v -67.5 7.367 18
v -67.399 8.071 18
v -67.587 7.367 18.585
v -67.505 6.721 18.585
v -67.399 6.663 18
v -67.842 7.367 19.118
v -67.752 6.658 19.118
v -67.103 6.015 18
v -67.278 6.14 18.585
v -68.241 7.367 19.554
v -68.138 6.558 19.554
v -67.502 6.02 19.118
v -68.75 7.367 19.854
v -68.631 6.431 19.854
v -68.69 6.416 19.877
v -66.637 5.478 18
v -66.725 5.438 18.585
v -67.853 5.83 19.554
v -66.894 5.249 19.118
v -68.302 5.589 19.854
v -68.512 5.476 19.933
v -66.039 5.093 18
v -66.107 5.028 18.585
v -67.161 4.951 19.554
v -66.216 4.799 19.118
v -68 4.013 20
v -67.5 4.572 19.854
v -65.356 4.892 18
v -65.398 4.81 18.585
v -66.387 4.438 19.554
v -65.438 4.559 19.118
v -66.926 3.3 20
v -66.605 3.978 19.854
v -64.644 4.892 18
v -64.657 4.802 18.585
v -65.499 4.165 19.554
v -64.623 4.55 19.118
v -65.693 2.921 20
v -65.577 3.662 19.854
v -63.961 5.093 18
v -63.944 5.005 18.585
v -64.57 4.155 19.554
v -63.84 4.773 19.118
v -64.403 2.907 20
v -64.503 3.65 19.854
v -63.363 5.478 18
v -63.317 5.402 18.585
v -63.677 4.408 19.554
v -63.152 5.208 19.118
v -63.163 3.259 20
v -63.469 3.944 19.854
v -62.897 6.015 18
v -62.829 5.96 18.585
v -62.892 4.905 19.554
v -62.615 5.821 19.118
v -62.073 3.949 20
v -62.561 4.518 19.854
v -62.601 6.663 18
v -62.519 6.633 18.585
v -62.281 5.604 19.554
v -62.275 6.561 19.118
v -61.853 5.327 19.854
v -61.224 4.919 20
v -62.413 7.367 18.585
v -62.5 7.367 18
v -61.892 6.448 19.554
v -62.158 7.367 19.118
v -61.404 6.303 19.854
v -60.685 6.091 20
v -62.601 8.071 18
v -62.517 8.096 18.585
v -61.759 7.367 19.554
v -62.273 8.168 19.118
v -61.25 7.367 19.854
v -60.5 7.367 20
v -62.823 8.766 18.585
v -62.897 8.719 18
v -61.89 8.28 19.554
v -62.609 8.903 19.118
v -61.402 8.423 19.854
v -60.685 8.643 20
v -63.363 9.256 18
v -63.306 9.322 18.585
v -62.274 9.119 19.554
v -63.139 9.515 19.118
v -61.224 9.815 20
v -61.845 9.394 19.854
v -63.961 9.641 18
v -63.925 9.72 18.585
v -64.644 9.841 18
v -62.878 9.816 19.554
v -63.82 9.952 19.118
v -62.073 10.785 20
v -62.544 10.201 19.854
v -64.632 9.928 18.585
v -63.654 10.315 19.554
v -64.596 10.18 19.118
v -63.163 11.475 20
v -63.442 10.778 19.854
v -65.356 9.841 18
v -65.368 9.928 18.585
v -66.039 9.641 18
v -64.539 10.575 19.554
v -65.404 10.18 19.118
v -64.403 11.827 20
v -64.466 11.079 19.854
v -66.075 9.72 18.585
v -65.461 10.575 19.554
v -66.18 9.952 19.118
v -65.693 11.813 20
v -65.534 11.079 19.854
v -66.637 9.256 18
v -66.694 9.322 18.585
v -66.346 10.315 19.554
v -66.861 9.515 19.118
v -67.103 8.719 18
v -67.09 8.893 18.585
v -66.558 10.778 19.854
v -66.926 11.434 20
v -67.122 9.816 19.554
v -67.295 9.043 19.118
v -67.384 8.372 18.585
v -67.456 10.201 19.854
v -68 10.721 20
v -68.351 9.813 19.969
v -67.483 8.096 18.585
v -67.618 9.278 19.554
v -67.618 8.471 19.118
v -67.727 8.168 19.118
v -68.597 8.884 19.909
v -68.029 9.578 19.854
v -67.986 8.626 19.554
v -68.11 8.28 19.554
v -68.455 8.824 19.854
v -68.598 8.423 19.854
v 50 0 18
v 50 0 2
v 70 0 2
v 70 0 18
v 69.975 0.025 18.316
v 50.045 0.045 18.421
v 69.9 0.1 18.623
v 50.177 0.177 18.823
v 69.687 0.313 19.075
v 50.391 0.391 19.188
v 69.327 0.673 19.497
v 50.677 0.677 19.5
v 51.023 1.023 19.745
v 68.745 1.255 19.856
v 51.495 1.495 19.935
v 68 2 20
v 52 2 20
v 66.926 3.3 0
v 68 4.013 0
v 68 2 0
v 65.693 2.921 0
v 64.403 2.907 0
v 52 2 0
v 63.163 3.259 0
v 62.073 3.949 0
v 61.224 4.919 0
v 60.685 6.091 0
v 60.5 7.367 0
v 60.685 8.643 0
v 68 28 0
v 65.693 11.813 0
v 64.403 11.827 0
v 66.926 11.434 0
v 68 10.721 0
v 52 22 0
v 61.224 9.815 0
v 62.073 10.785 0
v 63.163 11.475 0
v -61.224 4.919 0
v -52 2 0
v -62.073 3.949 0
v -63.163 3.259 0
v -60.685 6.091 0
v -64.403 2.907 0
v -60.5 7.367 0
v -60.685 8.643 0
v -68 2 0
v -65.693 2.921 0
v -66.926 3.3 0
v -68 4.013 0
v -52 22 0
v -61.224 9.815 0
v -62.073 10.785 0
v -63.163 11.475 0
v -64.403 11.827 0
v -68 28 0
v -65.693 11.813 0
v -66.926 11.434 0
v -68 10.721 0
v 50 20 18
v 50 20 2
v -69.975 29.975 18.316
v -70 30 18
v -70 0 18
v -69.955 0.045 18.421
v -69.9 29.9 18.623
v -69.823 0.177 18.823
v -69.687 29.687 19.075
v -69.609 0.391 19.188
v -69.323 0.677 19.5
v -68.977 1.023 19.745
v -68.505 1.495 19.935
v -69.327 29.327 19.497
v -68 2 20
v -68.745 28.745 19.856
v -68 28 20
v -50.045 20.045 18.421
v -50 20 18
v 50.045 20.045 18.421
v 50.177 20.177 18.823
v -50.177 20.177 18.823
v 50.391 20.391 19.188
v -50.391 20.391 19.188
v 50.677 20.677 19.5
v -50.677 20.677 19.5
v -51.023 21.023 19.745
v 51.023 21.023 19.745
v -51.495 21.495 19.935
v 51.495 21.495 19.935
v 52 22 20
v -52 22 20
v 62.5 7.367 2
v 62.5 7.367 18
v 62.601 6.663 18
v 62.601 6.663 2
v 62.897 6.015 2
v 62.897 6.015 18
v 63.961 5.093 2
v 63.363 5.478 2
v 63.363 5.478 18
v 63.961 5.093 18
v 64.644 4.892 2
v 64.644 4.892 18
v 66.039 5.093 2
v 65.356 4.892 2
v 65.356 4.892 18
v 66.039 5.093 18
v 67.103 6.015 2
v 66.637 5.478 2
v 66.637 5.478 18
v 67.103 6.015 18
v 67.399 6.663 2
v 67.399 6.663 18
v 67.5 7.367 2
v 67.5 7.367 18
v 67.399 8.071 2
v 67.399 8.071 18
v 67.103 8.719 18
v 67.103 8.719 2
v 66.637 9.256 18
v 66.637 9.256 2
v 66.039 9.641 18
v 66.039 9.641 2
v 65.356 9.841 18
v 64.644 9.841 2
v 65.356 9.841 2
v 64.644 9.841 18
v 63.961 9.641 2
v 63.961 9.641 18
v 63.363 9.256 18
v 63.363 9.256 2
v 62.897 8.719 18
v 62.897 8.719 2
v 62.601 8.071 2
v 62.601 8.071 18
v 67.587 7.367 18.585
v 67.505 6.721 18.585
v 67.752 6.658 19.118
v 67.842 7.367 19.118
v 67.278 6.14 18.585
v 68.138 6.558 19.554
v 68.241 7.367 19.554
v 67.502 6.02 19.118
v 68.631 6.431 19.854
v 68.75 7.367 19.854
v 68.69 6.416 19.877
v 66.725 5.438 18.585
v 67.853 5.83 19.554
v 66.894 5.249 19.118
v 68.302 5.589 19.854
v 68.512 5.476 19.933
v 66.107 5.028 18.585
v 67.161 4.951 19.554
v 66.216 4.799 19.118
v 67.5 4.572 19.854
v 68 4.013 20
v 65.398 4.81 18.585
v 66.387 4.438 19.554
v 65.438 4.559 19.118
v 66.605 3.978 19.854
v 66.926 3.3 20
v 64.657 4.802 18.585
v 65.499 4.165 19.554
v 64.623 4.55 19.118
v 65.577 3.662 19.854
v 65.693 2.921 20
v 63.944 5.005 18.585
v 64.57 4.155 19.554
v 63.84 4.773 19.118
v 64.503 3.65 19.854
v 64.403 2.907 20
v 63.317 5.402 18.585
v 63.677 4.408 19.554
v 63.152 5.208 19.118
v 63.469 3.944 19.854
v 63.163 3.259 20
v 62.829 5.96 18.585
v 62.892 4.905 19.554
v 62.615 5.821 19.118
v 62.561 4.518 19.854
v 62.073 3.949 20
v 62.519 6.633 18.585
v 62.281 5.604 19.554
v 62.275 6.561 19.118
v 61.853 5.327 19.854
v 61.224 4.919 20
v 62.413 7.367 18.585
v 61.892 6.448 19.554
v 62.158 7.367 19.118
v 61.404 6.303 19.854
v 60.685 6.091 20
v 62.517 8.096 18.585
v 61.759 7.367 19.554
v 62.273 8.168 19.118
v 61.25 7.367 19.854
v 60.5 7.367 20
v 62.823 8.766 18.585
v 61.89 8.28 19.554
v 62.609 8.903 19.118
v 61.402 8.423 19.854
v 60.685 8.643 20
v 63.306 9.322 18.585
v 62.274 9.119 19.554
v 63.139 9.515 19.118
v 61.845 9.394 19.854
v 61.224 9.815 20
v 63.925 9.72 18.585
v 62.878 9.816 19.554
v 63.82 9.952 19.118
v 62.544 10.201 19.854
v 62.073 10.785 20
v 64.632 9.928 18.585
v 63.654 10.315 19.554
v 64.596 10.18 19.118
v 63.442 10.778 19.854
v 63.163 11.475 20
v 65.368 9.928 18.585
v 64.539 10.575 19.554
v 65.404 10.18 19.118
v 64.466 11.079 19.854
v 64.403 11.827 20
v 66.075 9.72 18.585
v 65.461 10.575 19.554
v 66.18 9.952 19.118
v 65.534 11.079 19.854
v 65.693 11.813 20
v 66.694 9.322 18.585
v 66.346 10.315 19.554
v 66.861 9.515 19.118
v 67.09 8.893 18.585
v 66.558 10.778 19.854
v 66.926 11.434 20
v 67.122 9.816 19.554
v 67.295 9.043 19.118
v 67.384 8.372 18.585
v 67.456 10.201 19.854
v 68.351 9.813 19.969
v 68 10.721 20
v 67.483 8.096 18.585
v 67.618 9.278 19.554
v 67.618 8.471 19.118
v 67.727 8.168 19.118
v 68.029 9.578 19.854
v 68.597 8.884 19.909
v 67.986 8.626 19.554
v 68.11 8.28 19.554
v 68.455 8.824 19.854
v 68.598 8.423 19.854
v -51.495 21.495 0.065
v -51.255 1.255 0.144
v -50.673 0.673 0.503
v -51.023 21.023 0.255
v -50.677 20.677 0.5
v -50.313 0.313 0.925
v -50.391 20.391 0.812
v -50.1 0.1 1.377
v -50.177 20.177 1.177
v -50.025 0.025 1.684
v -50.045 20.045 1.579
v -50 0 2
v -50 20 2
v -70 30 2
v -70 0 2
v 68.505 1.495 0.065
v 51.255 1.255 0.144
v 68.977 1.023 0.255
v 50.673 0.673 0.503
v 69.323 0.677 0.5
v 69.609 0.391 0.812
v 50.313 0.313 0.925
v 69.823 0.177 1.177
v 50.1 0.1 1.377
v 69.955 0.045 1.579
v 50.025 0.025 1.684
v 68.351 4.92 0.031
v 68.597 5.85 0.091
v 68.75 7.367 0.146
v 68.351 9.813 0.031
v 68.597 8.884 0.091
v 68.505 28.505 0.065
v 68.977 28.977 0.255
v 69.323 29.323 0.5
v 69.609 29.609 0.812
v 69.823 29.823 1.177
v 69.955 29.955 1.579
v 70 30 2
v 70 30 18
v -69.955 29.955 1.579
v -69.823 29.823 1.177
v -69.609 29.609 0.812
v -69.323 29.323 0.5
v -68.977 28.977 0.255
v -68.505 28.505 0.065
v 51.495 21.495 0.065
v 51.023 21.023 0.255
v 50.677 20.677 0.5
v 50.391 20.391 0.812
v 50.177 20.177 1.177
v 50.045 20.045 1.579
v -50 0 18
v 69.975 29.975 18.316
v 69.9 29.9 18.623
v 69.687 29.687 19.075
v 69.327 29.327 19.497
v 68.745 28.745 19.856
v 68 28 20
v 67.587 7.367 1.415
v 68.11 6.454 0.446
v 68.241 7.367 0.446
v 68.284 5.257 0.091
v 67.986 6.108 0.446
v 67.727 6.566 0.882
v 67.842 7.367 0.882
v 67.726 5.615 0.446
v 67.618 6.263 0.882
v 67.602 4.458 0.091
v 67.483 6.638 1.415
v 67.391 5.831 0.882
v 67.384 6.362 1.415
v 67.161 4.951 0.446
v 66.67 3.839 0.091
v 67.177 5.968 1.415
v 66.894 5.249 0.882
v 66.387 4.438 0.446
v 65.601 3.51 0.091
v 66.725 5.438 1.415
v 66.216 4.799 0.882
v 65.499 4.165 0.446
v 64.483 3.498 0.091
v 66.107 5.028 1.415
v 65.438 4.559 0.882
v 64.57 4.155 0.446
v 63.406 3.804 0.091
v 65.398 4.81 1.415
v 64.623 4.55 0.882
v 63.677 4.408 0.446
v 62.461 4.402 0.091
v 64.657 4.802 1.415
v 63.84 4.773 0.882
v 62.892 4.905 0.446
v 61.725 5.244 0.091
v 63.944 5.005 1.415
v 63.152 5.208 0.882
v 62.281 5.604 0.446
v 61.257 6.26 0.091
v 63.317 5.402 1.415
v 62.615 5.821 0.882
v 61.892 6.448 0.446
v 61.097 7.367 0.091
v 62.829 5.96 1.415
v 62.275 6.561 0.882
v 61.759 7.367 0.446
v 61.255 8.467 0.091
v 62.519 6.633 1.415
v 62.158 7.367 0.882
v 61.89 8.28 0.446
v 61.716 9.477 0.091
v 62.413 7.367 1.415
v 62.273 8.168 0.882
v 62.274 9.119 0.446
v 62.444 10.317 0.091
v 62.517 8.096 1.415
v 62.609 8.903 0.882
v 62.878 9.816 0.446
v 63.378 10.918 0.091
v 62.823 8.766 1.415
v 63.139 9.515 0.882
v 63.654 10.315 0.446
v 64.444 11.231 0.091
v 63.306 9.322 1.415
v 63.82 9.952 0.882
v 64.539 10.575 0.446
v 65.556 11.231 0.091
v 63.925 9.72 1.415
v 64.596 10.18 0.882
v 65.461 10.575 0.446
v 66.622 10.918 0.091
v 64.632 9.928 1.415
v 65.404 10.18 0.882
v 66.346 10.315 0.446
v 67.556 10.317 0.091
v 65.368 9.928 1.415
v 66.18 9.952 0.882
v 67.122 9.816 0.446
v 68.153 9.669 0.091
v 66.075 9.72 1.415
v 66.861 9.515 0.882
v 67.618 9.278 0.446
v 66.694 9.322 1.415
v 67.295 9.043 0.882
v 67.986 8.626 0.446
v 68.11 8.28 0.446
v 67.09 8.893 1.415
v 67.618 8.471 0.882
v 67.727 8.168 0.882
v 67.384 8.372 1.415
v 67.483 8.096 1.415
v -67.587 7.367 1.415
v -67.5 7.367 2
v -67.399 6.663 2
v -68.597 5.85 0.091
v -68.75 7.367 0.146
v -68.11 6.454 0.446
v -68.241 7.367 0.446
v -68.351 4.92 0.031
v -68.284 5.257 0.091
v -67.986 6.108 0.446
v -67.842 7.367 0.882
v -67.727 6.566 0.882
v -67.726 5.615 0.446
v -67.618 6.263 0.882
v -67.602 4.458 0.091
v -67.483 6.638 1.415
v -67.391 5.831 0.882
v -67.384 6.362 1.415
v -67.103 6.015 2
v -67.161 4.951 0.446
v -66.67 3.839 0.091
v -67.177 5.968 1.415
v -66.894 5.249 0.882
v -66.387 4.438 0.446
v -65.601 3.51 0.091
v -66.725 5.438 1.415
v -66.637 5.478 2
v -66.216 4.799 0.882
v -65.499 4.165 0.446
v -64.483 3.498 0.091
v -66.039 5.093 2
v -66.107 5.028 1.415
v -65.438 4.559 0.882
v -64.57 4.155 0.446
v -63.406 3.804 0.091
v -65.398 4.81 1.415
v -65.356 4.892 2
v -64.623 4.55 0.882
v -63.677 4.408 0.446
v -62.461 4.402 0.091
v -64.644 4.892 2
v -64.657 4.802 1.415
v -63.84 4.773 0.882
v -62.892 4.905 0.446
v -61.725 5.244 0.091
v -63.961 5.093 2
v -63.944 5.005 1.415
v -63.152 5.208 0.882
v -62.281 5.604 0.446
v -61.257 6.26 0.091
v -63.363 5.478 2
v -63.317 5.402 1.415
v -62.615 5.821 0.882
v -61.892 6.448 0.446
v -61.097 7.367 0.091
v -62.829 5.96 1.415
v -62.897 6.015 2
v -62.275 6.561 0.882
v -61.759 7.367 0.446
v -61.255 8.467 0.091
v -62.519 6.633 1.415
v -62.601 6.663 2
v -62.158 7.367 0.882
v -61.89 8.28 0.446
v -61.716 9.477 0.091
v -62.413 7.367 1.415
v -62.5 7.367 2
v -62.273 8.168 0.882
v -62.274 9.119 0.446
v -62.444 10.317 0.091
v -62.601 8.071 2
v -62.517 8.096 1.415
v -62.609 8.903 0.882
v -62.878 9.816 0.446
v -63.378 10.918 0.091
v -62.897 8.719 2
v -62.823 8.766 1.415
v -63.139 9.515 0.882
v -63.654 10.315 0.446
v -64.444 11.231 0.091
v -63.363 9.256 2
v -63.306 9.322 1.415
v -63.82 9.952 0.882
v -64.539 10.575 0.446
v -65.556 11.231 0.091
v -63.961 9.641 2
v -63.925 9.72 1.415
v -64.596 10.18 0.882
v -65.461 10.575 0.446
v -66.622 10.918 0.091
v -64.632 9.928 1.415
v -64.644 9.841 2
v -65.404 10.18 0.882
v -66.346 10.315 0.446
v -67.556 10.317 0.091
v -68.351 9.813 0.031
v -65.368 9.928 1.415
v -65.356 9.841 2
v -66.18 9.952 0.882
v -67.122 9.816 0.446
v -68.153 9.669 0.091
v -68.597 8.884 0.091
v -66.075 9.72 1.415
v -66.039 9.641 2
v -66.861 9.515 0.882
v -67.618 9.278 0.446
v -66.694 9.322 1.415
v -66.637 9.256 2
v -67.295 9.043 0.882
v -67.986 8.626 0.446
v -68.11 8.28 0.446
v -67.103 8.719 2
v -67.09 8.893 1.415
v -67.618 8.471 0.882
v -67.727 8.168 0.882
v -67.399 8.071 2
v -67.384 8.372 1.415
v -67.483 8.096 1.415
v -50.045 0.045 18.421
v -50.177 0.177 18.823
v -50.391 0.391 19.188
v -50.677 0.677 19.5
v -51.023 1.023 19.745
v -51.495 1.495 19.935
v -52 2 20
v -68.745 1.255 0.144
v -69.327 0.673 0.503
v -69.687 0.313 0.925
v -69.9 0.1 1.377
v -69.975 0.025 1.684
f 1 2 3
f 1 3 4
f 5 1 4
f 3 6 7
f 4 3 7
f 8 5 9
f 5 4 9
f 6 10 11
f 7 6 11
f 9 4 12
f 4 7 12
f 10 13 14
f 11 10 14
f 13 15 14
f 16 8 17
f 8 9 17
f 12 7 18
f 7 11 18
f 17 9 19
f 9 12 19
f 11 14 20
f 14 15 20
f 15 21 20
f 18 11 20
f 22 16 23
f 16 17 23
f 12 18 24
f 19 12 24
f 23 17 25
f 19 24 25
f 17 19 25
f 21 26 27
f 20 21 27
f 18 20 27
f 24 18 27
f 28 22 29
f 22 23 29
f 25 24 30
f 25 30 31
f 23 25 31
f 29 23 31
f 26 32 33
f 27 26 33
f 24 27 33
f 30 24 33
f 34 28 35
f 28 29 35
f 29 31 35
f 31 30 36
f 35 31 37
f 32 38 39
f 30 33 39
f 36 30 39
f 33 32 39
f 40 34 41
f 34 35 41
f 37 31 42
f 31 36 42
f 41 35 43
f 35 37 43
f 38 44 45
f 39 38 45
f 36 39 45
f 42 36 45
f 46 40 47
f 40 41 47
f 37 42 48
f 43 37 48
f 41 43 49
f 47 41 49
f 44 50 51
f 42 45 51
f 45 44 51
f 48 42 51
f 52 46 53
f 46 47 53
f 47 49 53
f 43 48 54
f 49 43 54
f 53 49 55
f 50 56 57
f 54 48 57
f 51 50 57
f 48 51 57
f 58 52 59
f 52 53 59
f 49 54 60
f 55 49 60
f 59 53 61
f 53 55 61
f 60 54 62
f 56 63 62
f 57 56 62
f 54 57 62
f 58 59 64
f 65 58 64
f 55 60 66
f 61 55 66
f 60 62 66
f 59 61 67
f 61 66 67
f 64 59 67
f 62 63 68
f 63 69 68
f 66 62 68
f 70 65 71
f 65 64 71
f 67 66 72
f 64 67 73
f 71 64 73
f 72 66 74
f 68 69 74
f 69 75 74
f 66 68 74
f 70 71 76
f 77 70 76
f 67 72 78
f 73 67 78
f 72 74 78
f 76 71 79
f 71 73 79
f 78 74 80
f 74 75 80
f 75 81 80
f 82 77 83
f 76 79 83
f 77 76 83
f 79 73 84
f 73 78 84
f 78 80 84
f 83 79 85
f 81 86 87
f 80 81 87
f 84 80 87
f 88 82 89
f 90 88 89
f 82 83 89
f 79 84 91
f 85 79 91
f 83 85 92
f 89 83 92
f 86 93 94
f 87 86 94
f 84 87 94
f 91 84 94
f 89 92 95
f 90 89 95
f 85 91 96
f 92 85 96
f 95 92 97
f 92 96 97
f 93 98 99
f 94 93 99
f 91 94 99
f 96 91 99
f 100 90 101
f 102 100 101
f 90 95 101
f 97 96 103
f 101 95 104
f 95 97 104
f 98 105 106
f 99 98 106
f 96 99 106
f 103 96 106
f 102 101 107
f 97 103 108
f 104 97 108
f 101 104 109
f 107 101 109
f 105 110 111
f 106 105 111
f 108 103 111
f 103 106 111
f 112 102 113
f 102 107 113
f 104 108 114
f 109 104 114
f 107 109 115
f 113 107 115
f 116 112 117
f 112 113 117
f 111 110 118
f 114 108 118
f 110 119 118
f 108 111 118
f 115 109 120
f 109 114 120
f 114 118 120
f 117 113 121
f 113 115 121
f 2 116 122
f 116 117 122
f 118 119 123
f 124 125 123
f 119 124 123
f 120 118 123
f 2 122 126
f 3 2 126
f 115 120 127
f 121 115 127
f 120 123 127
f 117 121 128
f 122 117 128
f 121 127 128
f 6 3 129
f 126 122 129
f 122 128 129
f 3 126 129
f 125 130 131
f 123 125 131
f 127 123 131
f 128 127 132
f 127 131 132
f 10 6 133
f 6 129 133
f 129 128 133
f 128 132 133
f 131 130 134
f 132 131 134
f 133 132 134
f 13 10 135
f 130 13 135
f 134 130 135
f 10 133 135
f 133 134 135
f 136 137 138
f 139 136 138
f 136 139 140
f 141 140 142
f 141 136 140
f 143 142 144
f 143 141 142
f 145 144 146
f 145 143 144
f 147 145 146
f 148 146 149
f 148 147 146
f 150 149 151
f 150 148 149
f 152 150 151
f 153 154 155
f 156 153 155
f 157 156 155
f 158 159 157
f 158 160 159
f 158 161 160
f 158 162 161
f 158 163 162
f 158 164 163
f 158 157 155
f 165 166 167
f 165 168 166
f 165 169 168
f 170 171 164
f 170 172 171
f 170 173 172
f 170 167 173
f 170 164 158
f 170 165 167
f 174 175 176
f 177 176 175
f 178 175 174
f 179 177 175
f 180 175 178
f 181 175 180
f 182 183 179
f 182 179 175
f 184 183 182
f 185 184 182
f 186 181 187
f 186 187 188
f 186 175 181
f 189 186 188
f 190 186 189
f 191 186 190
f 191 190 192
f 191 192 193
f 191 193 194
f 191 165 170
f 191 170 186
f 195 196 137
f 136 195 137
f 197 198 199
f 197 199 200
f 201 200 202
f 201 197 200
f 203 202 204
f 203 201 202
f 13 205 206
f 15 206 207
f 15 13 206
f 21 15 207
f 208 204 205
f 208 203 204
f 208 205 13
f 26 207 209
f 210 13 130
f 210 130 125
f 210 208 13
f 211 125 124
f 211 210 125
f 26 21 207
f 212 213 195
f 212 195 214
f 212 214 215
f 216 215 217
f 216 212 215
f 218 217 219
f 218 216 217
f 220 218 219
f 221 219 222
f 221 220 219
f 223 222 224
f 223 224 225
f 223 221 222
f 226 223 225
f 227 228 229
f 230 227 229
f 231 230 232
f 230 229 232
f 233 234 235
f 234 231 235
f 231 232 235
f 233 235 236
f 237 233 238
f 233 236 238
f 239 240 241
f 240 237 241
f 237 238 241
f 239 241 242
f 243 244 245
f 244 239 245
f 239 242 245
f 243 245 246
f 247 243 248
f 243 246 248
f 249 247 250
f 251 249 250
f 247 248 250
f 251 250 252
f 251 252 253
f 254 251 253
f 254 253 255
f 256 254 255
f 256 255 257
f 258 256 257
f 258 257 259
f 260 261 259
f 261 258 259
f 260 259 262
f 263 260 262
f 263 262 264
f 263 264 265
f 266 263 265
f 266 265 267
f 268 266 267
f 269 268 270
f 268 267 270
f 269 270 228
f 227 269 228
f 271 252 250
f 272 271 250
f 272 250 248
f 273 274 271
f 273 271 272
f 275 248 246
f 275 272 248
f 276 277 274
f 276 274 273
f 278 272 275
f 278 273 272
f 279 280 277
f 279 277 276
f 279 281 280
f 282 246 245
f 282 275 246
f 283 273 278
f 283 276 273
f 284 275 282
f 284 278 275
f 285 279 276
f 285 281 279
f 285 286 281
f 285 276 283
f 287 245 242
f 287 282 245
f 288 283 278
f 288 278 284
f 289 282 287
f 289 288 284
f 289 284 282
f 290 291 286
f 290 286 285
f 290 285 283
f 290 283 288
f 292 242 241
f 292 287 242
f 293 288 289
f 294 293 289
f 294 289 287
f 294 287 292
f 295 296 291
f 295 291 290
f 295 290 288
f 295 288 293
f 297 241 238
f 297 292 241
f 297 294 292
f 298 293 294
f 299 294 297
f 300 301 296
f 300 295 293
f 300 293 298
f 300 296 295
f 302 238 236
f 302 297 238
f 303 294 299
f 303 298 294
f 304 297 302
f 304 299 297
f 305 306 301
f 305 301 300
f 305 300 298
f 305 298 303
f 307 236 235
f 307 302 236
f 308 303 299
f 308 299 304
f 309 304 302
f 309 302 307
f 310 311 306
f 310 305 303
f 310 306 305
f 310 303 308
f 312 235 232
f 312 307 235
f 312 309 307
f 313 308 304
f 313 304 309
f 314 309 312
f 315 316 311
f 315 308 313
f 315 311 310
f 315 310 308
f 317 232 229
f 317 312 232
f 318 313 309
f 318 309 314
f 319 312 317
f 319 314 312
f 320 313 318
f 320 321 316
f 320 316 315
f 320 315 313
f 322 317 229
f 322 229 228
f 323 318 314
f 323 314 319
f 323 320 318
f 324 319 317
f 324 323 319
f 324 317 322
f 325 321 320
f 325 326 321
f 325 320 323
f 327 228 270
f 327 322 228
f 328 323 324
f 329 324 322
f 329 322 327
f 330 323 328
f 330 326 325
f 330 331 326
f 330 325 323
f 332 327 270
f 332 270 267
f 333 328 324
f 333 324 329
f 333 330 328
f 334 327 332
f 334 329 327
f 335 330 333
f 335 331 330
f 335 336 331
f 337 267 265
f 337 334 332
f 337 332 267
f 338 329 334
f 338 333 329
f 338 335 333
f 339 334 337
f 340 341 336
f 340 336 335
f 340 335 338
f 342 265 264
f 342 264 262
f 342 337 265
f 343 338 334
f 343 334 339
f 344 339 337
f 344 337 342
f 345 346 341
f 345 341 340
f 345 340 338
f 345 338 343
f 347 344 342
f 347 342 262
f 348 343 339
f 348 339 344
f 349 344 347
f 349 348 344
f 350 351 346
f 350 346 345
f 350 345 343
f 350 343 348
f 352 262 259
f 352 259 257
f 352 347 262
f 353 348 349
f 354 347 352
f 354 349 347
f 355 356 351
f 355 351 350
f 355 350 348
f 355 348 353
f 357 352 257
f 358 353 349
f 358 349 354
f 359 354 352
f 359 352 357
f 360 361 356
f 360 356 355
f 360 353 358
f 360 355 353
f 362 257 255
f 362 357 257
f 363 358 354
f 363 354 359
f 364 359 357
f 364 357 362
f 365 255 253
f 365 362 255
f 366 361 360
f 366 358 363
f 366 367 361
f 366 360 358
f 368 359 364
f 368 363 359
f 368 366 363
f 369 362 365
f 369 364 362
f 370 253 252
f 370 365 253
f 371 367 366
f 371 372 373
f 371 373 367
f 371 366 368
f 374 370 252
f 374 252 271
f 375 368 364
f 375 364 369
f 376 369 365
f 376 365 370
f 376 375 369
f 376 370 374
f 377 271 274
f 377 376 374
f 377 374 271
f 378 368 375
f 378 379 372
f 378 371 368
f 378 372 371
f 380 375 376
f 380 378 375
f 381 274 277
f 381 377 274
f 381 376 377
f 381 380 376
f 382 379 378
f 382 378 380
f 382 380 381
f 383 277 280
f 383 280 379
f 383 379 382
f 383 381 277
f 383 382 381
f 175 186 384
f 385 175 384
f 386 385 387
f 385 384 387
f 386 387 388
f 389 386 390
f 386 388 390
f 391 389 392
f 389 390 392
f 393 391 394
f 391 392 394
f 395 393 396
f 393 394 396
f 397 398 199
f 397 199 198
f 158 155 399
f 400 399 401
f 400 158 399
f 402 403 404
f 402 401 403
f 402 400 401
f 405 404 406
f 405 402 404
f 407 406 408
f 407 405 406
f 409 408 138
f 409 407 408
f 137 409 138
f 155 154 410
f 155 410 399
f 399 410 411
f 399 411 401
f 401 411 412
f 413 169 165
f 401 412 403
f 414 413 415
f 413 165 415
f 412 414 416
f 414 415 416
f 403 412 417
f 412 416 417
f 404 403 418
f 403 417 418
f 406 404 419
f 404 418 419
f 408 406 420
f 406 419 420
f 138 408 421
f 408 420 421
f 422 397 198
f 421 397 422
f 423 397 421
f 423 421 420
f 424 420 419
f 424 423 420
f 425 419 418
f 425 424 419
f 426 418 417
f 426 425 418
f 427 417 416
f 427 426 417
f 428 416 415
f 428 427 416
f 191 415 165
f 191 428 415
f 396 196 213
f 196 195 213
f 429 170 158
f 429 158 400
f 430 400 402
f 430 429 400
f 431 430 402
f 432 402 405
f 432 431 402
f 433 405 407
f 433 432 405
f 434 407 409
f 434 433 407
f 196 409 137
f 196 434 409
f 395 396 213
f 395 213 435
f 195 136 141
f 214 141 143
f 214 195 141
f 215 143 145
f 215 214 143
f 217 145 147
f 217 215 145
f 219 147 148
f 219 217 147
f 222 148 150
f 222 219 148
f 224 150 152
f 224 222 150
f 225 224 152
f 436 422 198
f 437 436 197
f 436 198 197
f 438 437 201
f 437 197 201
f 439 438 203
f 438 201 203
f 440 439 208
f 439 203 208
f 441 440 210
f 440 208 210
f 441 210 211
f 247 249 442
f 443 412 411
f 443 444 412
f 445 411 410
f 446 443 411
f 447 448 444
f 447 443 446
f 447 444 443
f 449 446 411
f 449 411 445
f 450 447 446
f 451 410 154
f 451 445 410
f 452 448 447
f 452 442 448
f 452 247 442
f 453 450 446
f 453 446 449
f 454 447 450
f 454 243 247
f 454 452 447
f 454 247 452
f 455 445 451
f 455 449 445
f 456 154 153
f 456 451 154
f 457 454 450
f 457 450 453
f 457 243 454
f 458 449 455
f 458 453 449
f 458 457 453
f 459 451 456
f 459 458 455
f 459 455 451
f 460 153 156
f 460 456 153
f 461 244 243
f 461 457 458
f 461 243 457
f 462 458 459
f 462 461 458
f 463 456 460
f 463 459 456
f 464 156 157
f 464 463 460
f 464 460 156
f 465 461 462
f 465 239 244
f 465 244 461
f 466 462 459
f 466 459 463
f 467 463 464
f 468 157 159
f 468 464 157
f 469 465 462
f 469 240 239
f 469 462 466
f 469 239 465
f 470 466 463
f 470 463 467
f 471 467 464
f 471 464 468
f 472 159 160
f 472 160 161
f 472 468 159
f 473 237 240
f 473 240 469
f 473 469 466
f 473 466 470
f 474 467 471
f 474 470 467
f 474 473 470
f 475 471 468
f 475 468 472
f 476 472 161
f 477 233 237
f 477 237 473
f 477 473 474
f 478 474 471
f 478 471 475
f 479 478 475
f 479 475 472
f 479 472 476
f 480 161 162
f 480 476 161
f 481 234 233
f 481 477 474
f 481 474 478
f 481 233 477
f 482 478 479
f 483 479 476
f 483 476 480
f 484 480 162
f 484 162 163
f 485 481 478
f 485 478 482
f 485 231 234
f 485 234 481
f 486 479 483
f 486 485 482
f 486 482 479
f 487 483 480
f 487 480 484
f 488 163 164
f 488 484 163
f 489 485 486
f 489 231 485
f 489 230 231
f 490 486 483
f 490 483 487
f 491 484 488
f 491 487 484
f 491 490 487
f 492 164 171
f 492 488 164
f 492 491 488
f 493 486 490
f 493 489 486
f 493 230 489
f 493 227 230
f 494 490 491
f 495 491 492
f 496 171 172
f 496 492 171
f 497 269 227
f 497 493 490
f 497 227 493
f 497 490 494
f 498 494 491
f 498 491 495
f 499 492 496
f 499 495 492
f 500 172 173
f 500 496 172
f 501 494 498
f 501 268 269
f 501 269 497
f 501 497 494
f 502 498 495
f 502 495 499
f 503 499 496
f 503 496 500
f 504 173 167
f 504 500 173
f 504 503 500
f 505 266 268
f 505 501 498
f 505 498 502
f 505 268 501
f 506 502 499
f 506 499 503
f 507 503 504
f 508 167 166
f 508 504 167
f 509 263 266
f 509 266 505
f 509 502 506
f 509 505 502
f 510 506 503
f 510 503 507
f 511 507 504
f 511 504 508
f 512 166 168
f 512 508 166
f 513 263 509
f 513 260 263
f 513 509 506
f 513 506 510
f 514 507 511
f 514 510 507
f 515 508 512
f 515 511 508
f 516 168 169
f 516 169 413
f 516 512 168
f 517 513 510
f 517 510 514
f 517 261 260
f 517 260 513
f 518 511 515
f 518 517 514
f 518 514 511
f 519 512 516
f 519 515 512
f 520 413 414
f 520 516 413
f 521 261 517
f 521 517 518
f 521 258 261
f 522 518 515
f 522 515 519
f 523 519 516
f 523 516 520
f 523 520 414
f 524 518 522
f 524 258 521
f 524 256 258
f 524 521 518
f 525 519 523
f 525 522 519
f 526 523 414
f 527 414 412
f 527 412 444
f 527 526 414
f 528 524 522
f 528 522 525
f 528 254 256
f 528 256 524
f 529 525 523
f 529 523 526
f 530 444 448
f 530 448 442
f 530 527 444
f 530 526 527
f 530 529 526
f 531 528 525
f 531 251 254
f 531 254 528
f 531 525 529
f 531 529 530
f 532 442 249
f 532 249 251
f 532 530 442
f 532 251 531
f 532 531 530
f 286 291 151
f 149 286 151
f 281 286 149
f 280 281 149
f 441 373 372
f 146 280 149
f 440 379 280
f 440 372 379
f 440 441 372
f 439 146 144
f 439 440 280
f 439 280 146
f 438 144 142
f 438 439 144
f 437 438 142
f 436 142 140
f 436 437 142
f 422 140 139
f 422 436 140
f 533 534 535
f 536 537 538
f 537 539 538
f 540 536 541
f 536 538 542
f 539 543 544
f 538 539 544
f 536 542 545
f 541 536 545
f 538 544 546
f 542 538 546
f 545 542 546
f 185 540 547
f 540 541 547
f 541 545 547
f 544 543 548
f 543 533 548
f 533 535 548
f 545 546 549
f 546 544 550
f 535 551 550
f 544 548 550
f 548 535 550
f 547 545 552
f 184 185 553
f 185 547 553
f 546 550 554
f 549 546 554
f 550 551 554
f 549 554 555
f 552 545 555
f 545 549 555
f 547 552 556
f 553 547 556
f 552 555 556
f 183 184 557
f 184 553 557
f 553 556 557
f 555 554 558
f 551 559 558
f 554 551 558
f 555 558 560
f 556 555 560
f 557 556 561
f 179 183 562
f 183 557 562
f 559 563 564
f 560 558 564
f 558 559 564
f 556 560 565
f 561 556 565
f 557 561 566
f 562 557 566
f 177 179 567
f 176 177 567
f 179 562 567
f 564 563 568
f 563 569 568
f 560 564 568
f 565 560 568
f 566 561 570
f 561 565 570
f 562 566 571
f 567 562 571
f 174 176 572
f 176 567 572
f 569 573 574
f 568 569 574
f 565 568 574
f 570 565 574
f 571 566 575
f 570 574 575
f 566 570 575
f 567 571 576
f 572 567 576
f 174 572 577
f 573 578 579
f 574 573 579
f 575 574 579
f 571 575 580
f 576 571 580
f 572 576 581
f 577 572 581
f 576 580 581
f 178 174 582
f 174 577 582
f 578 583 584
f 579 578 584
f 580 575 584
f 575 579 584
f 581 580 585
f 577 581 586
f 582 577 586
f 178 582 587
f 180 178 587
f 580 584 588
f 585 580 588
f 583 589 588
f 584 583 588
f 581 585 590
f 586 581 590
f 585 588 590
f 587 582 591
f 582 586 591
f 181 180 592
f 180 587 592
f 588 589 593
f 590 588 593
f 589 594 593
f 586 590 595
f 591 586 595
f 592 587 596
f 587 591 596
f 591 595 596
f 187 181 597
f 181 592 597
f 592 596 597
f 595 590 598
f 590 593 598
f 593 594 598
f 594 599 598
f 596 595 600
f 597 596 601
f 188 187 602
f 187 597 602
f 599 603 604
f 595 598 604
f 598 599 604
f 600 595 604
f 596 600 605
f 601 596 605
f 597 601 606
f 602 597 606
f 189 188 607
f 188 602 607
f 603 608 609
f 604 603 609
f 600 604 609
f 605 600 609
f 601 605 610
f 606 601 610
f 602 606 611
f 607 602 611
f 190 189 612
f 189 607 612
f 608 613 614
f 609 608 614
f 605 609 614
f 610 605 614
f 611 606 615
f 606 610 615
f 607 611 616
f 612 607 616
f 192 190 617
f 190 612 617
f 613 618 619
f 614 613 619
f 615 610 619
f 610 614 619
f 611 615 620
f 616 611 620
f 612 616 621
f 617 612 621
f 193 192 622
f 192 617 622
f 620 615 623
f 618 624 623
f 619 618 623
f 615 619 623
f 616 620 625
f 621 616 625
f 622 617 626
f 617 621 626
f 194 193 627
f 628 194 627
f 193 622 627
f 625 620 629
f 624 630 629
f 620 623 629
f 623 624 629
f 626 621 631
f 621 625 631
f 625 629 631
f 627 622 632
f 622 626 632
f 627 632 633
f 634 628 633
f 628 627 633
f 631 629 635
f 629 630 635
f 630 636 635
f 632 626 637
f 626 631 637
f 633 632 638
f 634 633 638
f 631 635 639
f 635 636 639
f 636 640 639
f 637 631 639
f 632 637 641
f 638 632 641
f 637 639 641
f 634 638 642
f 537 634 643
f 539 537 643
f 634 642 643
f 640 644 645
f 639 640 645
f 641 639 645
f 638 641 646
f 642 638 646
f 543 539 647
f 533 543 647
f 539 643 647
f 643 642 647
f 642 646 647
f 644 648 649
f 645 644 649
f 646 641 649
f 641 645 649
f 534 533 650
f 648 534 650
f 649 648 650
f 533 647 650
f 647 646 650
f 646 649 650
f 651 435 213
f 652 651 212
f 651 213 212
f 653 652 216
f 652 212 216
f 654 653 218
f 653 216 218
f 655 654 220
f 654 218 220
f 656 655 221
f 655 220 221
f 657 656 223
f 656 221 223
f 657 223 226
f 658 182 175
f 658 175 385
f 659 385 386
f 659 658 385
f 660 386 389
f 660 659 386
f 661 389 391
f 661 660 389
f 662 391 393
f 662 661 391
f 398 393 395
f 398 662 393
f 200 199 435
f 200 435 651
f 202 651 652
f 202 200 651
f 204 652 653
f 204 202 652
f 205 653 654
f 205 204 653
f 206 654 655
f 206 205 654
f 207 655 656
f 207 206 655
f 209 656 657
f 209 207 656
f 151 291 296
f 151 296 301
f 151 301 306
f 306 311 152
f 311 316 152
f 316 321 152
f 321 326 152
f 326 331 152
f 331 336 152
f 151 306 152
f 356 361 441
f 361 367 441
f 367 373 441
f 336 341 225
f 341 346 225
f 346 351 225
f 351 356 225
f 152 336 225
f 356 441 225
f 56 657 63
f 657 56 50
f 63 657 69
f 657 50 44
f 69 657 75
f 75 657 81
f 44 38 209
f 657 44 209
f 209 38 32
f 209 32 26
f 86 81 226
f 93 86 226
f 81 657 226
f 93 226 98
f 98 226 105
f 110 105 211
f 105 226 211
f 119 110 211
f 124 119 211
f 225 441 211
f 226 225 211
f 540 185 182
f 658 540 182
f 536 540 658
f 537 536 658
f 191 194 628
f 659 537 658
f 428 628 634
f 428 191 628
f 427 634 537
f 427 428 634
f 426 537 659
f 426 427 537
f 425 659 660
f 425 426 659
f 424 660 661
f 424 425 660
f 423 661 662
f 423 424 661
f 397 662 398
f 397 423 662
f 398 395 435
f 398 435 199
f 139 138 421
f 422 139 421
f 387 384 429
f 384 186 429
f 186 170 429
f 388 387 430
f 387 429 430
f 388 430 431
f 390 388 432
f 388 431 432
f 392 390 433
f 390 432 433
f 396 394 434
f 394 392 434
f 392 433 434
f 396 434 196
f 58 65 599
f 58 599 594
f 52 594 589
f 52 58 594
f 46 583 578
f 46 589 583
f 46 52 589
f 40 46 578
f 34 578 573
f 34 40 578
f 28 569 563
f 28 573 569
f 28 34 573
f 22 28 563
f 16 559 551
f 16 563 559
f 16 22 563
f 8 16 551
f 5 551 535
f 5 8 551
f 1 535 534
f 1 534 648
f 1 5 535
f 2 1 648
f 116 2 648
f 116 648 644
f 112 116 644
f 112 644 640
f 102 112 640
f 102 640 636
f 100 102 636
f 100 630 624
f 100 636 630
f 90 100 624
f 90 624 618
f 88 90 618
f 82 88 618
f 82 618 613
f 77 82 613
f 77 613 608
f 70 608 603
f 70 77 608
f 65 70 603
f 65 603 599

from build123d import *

# Parameters (mm, degrees)
F1_DEPTH     = 20
F3_D         = 5
F5_T1_DEPTH  = 150
F5_T3_DEPTH  = 40
F5_T5_DEPTH  = 30
F5_T7_DEPTH  = 25
F5_T9_DEPTH  = 100
F5_T11_DEPTH = 30
F5_T25_DEPTH = 105
F5_T29_DEPTH = 30
F5_T36_DEPTH = 30
F5_T40_DEPTH = 105
F5_T47_DEPTH = 30
F5_T51_DEPTH = 105
F5_T58_DEPTH = 105
F5_T62_DEPTH = 30


# Not quite as in the source:
# - a fillet or chamfer that OpenCascade refuses, or shapes differently, is made with other operations: its cross-section is extruded or revolved along the edge and cut away or added


with BuildPart() as f1:
    # F0 (on Top) → F1 (new body)
    with BuildSketch(Plane.XY):
        Polygon((70, 30), (0, 30), (0, 20), (50, 20), (50, 0), (70, 0), align=None)
    extrude(amount=F1_DEPTH)

    # F3 (through all)
    with Locations(Plane(origin=(0, 0, 0), x_dir=(1, 0, 0), z_dir=(0, 0, -1))):
        with Locations((65, -7.3669357225)):
            Hole(F3_D / 2)

    # F4: F1 across face


with BuildPart() as f1_1:
    add(f1.part)
    add(f1.part.mirror(Plane(origin=(0, 25, 10), x_dir=(0, -1, 0), z_dir=(-1, 0, 0))))

    # F5: fillet of radius 2 on 20 edges, made by hand

    # F5_s2 → F5_t1 (cut)
    with BuildSketch(Plane.YZ.offset(-75)):
        with BuildLine():
            ThreePointArc((30, 18), (29.4142135624, 19.4142135624), (28, 20))
            Line((28, 20), (30, 20))
            Line((30, 20), (30, 18))
        make_face()
        with BuildLine():
            ThreePointArc((30, 2), (29.4142135624, 0.5857864376), (28, 0))
            Line((28, 0), (30, 0))
            Line((30, 0), (30, 2))
        make_face()
    extrude(amount=F5_T1_DEPTH, mode=Mode.SUBTRACT)

    # F5_s4 → F5_t3 (cut)
    with BuildSketch(Plane.XZ.offset(-35)):
        with BuildLine():
            ThreePointArc((-70, 18), (-69.4142135624, 19.4142135624), (-68, 20))
            Line((-68, 20), (-70, 20))
            Line((-70, 20), (-70, 18))
        make_face()
        with BuildLine():
            ThreePointArc((68, 20), (69.4142135624, 19.4142135624), (70, 18))
            Line((70, 18), (70, 20))
            Line((70, 20), (68, 20))
        make_face()
        with BuildLine():
            ThreePointArc((-68, 0), (-69.4142135624, 0.5857864376), (-70, 2))
            Line((-70, 2), (-70, 0))
            Line((-70, 0), (-68, 0))
        make_face()
        with BuildLine():
            ThreePointArc((68, 0), (69.4142135624, 0.5857864376), (70, 2))
            Line((70, 2), (70, 0))
            Line((70, 0), (68, 0))
        make_face()
    extrude(amount=F5_T3_DEPTH, mode=Mode.SUBTRACT)

    # F5_s6 → F5_t5 (cut)
    with BuildSketch(Plane.YZ.offset(-75)):
        with BuildLine():
            ThreePointArc((0, 18), (0.5857864376, 19.4142135624), (2, 20))
            Line((2, 20), (0, 20))
            Line((0, 20), (0, 18))
        make_face()
        with BuildLine():
            ThreePointArc((2, 0), (0.5857864376, 0.5857864376), (0, 2))
            Line((0, 2), (0, 0))
            Line((0, 0), (2, 0))
        make_face()
    extrude(amount=F5_T5_DEPTH, mode=Mode.SUBTRACT)

    # F5_s8 → F5_t7 (cut)
    with BuildSketch(Plane.XZ.offset(-20)):
        with BuildLine():
            ThreePointArc((-50, 18), (-50.5857864376, 19.4142135624), (-52, 20))
            Line((-52, 20), (-50, 20))
            Line((-50, 20), (-50, 18))
        make_face()
        with BuildLine():
            ThreePointArc((50, 18), (50.5857864376, 19.4142135624), (52, 20))
            Line((52, 20), (50, 20))
            Line((50, 20), (50, 18))
        make_face()
        with BuildLine():
            ThreePointArc((-52, 0), (-50.5857864376, 0.5857864376), (-50, 2))
            Line((-50, 2), (-50, 0))
            Line((-50, 0), (-52, 0))
        make_face()
        with BuildLine():
            ThreePointArc((52, 0), (50.5857864376, 0.5857864376), (50, 2))
            Line((50, 2), (50, 0))
            Line((50, 0), (52, 0))
        make_face()
    extrude(amount=F5_T7_DEPTH, mode=Mode.SUBTRACT)

    # F5_s10 → F5_t9 (cut)
    with BuildSketch(Plane.YZ.offset(-50)):
        with BuildLine():
            ThreePointArc((20, 18), (20.5857864376, 19.4142135624), (22, 20))
            Line((22, 20), (20, 20))
            Line((20, 20), (20, 18))
        make_face()
        with BuildLine():
            ThreePointArc((22, 0), (20.5857864376, 0.5857864376), (20, 2))
            Line((20, 2), (20, 0))
            Line((20, 0), (22, 0))
        make_face()
    extrude(amount=F5_T9_DEPTH, mode=Mode.SUBTRACT)

    # F5_s12 → F5_t11 (cut)
    with BuildSketch(Plane.YZ.offset(45)):
        with BuildLine():
            ThreePointArc((0, 18), (0.5857864376, 19.4142135624), (2, 20))
            Line((2, 20), (0, 20))
            Line((0, 20), (0, 18))
        make_face()
        with BuildLine():
            ThreePointArc((2, 0), (0.5857864376, 0.5857864376), (0, 2))
            Line((0, 2), (0, 0))
            Line((0, 0), (2, 0))
        make_face()
    extrude(amount=F5_T11_DEPTH, mode=Mode.SUBTRACT)

    # F5_s13 → F5_t14 (revolve, cut)
    with BuildSketch(Plane.XZ.offset(-7.3669357225)):
        with BuildLine():
            ThreePointArc((67.5, 18), (68.0857864376, 19.4142135624), (69.5, 20))
            Line((69.5, 20), (67.5, 20))
            Line((67.5, 20), (67.5, 18))
        make_face()
    revolve(axis=Axis((65, 7.3669357225, 20), (0, 0, -1)), mode=Mode.SUBTRACT)

    # F5_s15 → F5_t16 (revolve, cut)
    with BuildSketch(Plane.XZ.offset(-7.3669357225)):
        with BuildLine():
            ThreePointArc((-67.5, 18), (-68.0857864376, 19.4142135624), (-69.5, 20))
            Line((-69.5, 20), (-67.5, 20))
            Line((-67.5, 20), (-67.5, 18))
        make_face()
    revolve(axis=Axis((-65, 7.3669357225, 20), (0, 0, 1)), mode=Mode.SUBTRACT)

    # F5_s17 → F5_t18 (revolve, cut)
    with BuildSketch(Plane.XZ.offset(-7.3669357225)):
        with BuildLine():
            ThreePointArc((69.5, 0), (68.0857864376, 0.5857864376), (67.5, 2))
            Line((67.5, 2), (67.5, 0))
            Line((67.5, 0), (69.5, 0))
        make_face()
    revolve(axis=Axis((65, 7.3669357225, 0), (0, 0, -1)), mode=Mode.SUBTRACT)

    # F5_s19 → F5_t20 (revolve, cut)
    with BuildSketch(Plane.XZ.offset(-7.3669357225)):
        with BuildLine():
            ThreePointArc((-69.5, 0), (-68.0857864376, 0.5857864376), (-67.5, 2))
            Line((-67.5, 2), (-67.5, 0))
            Line((-67.5, 0), (-69.5, 0))
        make_face()
    revolve(axis=Axis((-65, 7.3669357225, 0), (0, 0, 1)), mode=Mode.SUBTRACT)


with BuildPart() as f5_tool23:
    # F5_s24 → F5_t25 (new body)
    with BuildSketch(Plane.YZ.offset(-55)):
        with BuildLine():
            ThreePointArc((20, 18), (20.5857864376, 19.4142135624), (22, 20))
            Line((22, 20), (20, 20))
            Line((20, 20), (20, 18))
        make_face()
    extrude(amount=F5_T25_DEPTH)

    split(bisect_by=Plane.YZ.offset(-50), keep=Keep.BOTTOM)


with BuildPart() as f5_tool27:
    # F5_s28 → F5_t29 (new body)
    with BuildSketch(Plane.XZ.offset(-25)):
        with BuildLine():
            ThreePointArc((-50, 18), (-50.5857864376, 19.4142135624), (-52, 20))
            Line((-52, 20), (-50, 20))
            Line((-50, 20), (-50, 18))
        make_face()
    extrude(amount=F5_T29_DEPTH)

    split(bisect_by=Plane.XZ.offset(-20), keep=Keep.BOTTOM)


with BuildPart() as f5_tool23_1:
    add(f5_tool23.part)

    # F5_t31: intersect F5_tool27
    add(f5_tool27.part, mode=Mode.INTERSECT)


with BuildPart() as f1_2:
    add(f1_1.part)

    # F5_t21: cut F5_tool23
    add(f5_tool23_1.part, mode=Mode.SUBTRACT)


with BuildPart() as f5_tool34:
    # F5_s35 → F5_t36 (new body)
    with BuildSketch(Plane.XZ.offset(-25)):
        with BuildLine():
            ThreePointArc((50, 18), (50.5857864376, 19.4142135624), (52, 20))
            Line((52, 20), (50, 20))
            Line((50, 20), (50, 18))
        make_face()
    extrude(amount=F5_T36_DEPTH)

    split(bisect_by=Plane.XZ.offset(-20), keep=Keep.BOTTOM)


with BuildPart() as f5_tool38:
    # F5_s39 → F5_t40 (new body)
    with BuildSketch(Plane.YZ.offset(-50)):
        with BuildLine():
            ThreePointArc((20, 18), (20.5857864376, 19.4142135624), (22, 20))
            Line((22, 20), (20, 20))
            Line((20, 20), (20, 18))
        make_face()
    extrude(amount=F5_T40_DEPTH)

    split(bisect_by=Plane.YZ.offset(50), keep=Keep.TOP)


with BuildPart() as f5_tool34_1:
    add(f5_tool34.part)

    # F5_t42: intersect F5_tool38
    add(f5_tool38.part, mode=Mode.INTERSECT)


with BuildPart() as f1_3:
    add(f1_2.part)

    # F5_t32: cut F5_tool34
    add(f5_tool34_1.part, mode=Mode.SUBTRACT)


with BuildPart() as f5_tool45:
    # F5_s46 → F5_t47 (new body)
    with BuildSketch(Plane.XZ.offset(-25)):
        with BuildLine():
            ThreePointArc((-52, 0), (-50.5857864376, 0.5857864376), (-50, 2))
            Line((-50, 2), (-50, 0))
            Line((-50, 0), (-52, 0))
        make_face()
    extrude(amount=F5_T47_DEPTH)

    split(bisect_by=Plane.XZ.offset(-20), keep=Keep.BOTTOM)


with BuildPart() as f5_tool49:
    # F5_s50 → F5_t51 (new body)
    with BuildSketch(Plane.YZ.offset(50)):
        with BuildLine():
            ThreePointArc((22, 0), (20.5857864376, 0.5857864376), (20, 2))
            Line((20, 2), (20, 0))
            Line((20, 0), (22, 0))
        make_face()
    extrude(amount=-F5_T51_DEPTH)

    split(bisect_by=Plane.YZ.offset(-50), keep=Keep.BOTTOM)


with BuildPart() as f5_tool45_1:
    add(f5_tool45.part)

    # F5_t53: intersect F5_tool49
    add(f5_tool49.part, mode=Mode.INTERSECT)


with BuildPart() as f1_4:
    add(f1_3.part)

    # F5_t43: cut F5_tool45
    add(f5_tool45_1.part, mode=Mode.SUBTRACT)


with BuildPart() as f5_tool56:
    # F5_s57 → F5_t58 (new body)
    with BuildSketch(Plane.YZ.offset(55)):
        with BuildLine():
            ThreePointArc((22, 0), (20.5857864376, 0.5857864376), (20, 2))
            Line((20, 2), (20, 0))
            Line((20, 0), (22, 0))
        make_face()
    extrude(amount=-F5_T58_DEPTH)

    split(bisect_by=Plane.YZ.offset(50), keep=Keep.TOP)


with BuildPart() as f5_tool60:
    # F5_s61 → F5_t62 (new body)
    with BuildSketch(Plane.XZ.offset(-25)):
        with BuildLine():
            ThreePointArc((52, 0), (50.5857864376, 0.5857864376), (50, 2))
            Line((50, 2), (50, 0))
            Line((50, 0), (52, 0))
        make_face()
    extrude(amount=F5_T62_DEPTH)

    split(bisect_by=Plane.XZ.offset(-20), keep=Keep.BOTTOM)


with BuildPart() as f5_tool56_1:
    add(f5_tool56.part)

    # F5_t64: intersect F5_tool60
    add(f5_tool60.part, mode=Mode.INTERSECT)


with BuildPart() as f1_5:
    add(f1_4.part)

    # F5_t54: cut F5_tool56
    add(f5_tool56_1.part, mode=Mode.SUBTRACT)


solid = f1_5.part
